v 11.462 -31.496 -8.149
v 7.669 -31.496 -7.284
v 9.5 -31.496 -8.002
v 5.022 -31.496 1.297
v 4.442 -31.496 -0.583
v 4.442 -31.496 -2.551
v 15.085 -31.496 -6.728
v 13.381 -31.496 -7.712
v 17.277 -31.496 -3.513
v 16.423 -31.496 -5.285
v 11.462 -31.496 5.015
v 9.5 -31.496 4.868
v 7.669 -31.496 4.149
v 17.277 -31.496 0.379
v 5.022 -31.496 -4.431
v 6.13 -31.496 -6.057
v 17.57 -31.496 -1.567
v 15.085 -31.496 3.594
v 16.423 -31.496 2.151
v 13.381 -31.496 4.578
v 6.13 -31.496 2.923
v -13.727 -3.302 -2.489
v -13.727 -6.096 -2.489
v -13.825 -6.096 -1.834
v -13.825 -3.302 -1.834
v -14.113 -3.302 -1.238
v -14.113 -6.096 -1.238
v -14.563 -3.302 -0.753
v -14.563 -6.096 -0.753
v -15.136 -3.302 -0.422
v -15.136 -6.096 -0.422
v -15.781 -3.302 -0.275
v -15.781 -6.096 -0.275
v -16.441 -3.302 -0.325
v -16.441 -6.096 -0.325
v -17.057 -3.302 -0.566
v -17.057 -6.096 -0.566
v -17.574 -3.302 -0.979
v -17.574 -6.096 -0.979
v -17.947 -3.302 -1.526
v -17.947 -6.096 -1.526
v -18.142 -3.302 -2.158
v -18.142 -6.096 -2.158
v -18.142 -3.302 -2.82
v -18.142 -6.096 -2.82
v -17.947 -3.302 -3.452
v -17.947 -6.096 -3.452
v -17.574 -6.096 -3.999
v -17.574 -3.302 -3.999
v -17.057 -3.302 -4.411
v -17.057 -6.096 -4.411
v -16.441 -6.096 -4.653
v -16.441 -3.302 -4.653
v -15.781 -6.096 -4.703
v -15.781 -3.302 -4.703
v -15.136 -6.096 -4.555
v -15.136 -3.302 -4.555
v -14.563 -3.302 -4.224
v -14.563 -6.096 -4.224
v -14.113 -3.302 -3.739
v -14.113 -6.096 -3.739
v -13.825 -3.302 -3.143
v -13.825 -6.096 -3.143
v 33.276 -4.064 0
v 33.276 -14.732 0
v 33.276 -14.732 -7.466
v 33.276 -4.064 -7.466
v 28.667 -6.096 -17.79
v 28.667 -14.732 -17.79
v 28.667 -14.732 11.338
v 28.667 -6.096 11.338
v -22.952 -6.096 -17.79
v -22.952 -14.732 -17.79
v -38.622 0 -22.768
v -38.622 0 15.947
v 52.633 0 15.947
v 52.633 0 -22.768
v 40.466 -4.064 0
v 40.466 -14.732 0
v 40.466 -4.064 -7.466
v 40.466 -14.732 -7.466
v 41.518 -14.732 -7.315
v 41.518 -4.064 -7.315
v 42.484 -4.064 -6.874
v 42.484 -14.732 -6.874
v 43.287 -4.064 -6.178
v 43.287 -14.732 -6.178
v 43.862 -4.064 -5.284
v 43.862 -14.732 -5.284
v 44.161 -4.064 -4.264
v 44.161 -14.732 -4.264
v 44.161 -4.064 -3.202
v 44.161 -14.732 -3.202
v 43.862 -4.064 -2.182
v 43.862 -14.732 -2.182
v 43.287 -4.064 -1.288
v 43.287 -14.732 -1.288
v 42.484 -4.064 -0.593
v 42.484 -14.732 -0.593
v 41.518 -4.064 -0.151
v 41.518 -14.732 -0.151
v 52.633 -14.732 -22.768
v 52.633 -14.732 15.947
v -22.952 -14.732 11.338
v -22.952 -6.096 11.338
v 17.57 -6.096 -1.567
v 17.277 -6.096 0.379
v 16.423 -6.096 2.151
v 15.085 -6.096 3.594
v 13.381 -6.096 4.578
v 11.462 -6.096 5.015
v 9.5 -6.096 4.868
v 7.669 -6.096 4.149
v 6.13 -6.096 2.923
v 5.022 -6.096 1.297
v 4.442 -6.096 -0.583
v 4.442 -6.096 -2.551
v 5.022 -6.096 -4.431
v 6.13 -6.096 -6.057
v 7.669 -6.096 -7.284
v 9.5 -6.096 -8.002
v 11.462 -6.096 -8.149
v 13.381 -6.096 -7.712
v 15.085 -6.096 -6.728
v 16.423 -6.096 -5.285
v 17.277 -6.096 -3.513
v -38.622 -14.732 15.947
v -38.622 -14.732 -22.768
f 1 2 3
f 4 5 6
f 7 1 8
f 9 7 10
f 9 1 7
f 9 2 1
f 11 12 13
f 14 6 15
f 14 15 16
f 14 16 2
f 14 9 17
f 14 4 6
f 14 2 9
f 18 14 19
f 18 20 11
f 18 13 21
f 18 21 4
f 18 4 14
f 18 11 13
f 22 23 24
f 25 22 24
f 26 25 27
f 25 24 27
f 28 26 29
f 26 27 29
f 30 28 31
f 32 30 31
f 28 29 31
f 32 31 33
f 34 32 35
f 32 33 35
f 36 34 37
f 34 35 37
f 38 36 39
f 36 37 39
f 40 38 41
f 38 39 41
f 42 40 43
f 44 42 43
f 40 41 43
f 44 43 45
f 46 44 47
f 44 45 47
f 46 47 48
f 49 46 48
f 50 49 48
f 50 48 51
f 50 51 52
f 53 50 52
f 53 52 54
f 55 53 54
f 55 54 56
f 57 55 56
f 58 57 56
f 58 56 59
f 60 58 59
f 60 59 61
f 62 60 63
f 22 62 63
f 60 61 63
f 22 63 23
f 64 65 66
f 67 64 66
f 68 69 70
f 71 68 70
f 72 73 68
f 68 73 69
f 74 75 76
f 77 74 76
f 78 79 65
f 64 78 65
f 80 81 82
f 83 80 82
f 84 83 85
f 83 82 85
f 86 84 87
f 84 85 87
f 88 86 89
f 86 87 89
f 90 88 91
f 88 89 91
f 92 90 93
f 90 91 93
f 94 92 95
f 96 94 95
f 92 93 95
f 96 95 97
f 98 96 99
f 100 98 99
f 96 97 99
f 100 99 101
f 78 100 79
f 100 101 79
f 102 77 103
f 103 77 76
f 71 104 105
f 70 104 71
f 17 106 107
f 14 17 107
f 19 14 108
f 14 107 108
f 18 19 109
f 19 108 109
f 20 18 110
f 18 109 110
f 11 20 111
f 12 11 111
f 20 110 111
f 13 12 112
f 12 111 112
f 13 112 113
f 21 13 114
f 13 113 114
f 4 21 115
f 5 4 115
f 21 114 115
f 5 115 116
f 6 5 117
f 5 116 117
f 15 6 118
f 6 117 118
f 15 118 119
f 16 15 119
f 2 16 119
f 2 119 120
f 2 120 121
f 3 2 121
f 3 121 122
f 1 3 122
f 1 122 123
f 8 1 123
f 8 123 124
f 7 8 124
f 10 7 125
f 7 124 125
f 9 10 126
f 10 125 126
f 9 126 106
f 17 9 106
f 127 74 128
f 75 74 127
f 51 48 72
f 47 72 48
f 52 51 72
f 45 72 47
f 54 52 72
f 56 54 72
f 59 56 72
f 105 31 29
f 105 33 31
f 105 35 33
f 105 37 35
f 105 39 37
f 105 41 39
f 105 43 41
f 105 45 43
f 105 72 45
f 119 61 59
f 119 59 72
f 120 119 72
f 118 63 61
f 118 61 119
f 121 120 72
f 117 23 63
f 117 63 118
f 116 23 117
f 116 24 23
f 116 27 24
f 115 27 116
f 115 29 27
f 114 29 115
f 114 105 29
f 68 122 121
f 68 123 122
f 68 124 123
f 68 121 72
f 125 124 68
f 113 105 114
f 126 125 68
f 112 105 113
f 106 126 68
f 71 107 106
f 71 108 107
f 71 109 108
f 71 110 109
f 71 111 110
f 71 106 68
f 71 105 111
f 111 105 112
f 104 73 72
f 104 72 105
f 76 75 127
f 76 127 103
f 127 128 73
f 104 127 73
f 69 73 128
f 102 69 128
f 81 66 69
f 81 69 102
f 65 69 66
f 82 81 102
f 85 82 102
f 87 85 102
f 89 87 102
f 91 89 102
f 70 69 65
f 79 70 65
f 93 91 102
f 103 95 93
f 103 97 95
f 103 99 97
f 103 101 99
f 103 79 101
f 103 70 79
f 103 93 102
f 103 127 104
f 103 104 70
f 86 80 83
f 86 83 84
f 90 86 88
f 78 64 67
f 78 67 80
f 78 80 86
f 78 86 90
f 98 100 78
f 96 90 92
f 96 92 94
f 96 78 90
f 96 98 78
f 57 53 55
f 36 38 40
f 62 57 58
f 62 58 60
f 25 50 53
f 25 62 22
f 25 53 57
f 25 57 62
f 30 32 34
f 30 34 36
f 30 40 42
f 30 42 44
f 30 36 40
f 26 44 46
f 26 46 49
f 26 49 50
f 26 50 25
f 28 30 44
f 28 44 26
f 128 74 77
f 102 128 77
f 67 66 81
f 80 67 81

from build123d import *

# Parameters (mm, degrees)
F0_W     = 91.255646
F0_H     = 38.714515
F1_DEPTH = 14.732
F2_W     = 51.619354
F2_H     = 29.128062
F3_DEPTH = 8.636
F4_R     = 2.219926
F5_DEPTH = 2.794
F7_DEPTH = 10.668
F8_R     = 6.600831
F9_DEPTH = 25.4


with BuildPart() as f1:
    # F0 (on Front) → F1 (new body)
    with BuildSketch(Plane.XZ):
        with Locations((7.005485, -3.410563)):
            Rectangle(F0_W, F0_H)
    extrude(amount=F1_DEPTH)

    # F2 (on face) → F3 (cut)
    with BuildSketch(Plane.XZ.offset(14.732)):
        with Locations((2.857499, -3.22621)):
            Rectangle(F2_W, F2_H)
    extrude(amount=-F3_DEPTH, mode=Mode.SUBTRACT)

    # F4 (on face) → F5 (cut)
    with BuildSketch(Plane.XZ.offset(6.096)):
        with Locations((-15.946694, -2.48879)):
            Circle(F4_R)
    extrude(amount=-F5_DEPTH, mode=Mode.SUBTRACT)

    # F6 (on face) → F7 (cut)
    with BuildSketch(Plane.XZ.offset(14.732)):
        with BuildLine():
            Line((33.276051, 0), (33.276051, -3.22621))
            Line((33.276051, -3.22621), (33.276051, -7.466371))
            Line((33.276051, -7.466371), (40.465884, -7.466371))
            ThreePointArc((40.465884, -7.466371), (44.199069, -3.733185), (40.465884, 0))
            Line((40.465884, 0), (33.276051, 0))
        make_face()
    extrude(amount=-F7_DEPTH, mode=Mode.SUBTRACT)

    # F8 (on face) → F9 (join)
    with BuildSketch(Plane.XZ.offset(6.096)):
        with Locations((10.969113, -1.567016)):
            Circle(F8_R)
    extrude(amount=F9_DEPTH)


solid = f1.part
